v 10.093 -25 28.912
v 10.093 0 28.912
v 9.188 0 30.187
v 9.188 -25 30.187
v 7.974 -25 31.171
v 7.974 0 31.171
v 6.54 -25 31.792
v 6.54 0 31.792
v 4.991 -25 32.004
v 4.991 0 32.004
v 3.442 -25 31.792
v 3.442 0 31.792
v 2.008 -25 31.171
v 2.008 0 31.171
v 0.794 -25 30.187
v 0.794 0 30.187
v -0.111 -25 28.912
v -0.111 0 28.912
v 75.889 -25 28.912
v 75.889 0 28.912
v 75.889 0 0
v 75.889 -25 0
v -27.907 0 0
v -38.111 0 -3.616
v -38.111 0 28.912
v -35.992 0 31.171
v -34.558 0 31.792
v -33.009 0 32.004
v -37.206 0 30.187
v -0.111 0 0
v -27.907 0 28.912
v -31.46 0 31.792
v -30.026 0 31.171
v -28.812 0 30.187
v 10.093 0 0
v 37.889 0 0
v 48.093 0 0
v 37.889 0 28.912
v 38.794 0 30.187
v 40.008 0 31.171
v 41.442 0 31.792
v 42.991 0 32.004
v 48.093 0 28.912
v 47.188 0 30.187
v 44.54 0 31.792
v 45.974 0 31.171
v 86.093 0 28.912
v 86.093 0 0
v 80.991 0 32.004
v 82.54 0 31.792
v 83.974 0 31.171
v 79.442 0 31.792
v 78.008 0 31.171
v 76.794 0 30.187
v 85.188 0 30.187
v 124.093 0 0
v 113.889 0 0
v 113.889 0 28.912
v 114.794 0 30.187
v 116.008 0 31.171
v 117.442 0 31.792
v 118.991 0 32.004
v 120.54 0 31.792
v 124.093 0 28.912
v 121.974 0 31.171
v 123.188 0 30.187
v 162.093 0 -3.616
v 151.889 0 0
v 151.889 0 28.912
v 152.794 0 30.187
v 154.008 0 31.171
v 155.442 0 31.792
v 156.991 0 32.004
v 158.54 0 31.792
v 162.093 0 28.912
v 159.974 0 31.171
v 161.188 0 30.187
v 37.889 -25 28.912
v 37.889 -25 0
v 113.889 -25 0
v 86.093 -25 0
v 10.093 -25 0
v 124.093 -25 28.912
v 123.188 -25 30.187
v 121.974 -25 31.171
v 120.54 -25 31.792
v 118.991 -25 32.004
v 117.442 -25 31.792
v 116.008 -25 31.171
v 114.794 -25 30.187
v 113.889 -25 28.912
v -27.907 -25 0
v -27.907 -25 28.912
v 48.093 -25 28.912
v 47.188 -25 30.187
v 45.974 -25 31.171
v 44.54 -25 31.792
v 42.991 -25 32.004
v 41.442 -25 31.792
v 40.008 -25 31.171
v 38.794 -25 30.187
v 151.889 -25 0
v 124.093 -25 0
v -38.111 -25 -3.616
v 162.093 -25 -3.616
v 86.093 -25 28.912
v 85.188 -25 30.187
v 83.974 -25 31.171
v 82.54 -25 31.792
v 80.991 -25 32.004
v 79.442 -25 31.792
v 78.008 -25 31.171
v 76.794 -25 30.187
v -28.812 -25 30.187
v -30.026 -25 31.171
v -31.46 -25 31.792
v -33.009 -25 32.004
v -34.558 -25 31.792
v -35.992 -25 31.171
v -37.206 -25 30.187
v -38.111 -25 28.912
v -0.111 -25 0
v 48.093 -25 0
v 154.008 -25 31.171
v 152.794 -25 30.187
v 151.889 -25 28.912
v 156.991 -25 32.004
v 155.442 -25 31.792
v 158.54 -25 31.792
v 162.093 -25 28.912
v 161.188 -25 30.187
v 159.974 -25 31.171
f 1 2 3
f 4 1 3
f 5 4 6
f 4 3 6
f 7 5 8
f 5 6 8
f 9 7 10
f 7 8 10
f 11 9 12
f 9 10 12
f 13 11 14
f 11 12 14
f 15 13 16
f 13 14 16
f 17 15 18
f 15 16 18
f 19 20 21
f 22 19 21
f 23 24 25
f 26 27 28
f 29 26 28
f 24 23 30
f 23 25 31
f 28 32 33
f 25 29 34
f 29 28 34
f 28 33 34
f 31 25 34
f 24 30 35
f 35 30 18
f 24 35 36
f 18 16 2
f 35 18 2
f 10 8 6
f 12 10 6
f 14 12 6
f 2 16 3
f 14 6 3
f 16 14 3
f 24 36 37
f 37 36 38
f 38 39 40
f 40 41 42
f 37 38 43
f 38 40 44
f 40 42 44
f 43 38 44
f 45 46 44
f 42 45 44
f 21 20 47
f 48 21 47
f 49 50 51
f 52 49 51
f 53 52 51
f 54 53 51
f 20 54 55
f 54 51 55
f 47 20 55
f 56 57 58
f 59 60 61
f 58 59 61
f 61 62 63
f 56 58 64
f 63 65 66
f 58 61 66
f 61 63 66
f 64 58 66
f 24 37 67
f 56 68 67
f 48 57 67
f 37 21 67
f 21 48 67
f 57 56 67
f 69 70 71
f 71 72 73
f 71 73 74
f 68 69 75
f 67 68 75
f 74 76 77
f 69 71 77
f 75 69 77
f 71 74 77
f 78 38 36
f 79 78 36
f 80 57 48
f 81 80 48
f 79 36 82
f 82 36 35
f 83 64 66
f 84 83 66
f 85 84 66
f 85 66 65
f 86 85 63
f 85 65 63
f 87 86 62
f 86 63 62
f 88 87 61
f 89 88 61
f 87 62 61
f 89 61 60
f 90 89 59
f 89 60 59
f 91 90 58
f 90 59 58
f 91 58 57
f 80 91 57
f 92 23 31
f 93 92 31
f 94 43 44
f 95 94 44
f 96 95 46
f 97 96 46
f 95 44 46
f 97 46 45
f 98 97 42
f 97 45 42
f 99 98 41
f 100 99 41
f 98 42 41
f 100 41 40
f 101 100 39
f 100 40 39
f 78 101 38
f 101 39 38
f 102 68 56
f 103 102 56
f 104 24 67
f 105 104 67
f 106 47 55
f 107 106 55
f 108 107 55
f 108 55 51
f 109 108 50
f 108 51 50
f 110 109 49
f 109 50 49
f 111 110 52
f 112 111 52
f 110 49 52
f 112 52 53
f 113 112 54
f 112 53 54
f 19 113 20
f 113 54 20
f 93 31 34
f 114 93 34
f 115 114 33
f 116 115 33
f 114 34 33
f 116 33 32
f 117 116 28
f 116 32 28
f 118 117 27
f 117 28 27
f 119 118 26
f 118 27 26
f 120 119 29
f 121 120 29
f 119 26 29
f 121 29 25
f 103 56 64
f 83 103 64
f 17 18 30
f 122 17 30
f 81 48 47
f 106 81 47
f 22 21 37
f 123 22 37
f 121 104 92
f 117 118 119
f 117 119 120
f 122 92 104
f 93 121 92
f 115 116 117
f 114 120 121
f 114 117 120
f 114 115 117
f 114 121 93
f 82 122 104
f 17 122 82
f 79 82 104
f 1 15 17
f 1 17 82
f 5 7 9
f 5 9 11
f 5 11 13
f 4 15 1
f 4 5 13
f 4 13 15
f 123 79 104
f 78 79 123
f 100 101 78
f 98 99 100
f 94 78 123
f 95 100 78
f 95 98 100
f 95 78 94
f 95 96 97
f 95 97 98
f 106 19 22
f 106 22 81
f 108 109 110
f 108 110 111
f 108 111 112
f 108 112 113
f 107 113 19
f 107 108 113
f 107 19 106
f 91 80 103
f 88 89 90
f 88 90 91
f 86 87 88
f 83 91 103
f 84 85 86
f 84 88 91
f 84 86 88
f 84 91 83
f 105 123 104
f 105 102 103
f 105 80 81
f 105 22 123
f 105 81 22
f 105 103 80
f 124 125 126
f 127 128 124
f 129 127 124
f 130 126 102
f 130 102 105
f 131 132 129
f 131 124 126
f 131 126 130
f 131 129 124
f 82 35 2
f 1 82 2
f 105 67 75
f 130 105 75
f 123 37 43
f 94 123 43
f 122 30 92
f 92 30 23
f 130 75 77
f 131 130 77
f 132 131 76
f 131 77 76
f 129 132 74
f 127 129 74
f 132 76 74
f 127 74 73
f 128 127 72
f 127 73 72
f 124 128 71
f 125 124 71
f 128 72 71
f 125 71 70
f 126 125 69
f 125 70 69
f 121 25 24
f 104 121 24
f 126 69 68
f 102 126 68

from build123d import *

# Parameters (mm, degrees)
F1_DEPTH = 25


# Not quite as in the source:
# - a feature names something its author has since deleted; it is built from what else it names


with BuildPart() as f1:
    # F0 (on Front) → F1 (new body)
    with BuildSketch(Plane.XZ):
        with BuildLine():
            Line((-38.1111986935, 28.9119444788), (-38.1111986935, 0))
            Line((-38.1111986935, 0), (-27.9069803655, 0))
            Line((-27.9069803655, 0), (-27.9069803655, 28.9119444788))
            ThreePointArc((-27.9069803655, 28.9119444788), (-33.0090895295, 32.0041291416), (-38.1111986935, 28.9119444788))
        make_face()
        with BuildLine():
            Line((-0.1111986935, 28.9119444788), (-0.1111986935, 0))
            Line((-0.1111986935, 0), (10.0930196345, 0))
            Line((10.0930196345, 0), (10.0930196345, 28.9119444788))
            ThreePointArc((10.0930196345, 28.9119444788), (4.9909104705, 32.0041291416), (-0.1111986935, 28.9119444788))
        make_face()
        with BuildLine():
            Line((37.8888013065, 28.9119444788), (37.8888013065, 0))
            Line((37.8888013065, 0), (48.0930196345, 0))
            Line((48.0930196345, 0), (48.0930196345, 28.9119444788))
            ThreePointArc((48.0930196345, 28.9119444788), (42.9909104705, 32.0041291416), (37.8888013065, 28.9119444788))
        make_face()
        with BuildLine():
            Line((75.8888013065, 28.9119444788), (75.8888013065, 0))
            Line((75.8888013065, 0), (86.0930196345, 0))
            Line((86.0930196345, 0), (86.0930196345, 28.9119444788))
            ThreePointArc((86.0930196345, 28.9119444788), (80.9909104705, 32.0041291416), (75.8888013065, 28.9119444788))
        make_face()
        with BuildLine():
            Line((113.8888013065, 0), (124.0930196345, 0))
            Line((124.0930196345, 0), (124.0930196345, 28.9119444788))
            ThreePointArc((124.0930196345, 28.9119444788), (118.9909104705, 32.0041291416), (113.8888013065, 28.9119444788))
            Line((113.8888013065, 28.9119444788), (113.8888013065, 0))
        make_face()
        with BuildLine():
            Line((151.8888013065, 0), (162.0930196345, 0))
            Line((162.0930196345, 0), (162.0930196345, 28.9119444788))
            ThreePointArc((162.0930196345, 28.9119444788), (156.9909104705, 32.0041291416), (151.8888013065, 28.9119444788))
            Line((151.8888013065, 28.9119444788), (151.8888013065, 0))
        make_face()
        Polygon((-27.9069803655, 0), (-38.1111986935, 0), (-38.1111986935, -3.615781432), (162.0930196345, -3.615781432), (162.0930196345, 0), (151.8888013065, 0), (146.6320851445, 0), (131.5820539594, 0), (124.0930196345, 0), (113.8888013065, 0), (108.6320851445, 0), (93.5820539594, 0), (86.0930196345, 0), (75.8888013065, 0), (70.6320851445, 0), (55.5820539594, 0), (48.0930196345, 0), (37.8888013065, 0), (32.6320851445, 0), (10.0930196345, 0), (-0.1111986935, 0), (-5.3679148555, 0), align=None)
    extrude(amount=F1_DEPTH)


solid = f1.part
